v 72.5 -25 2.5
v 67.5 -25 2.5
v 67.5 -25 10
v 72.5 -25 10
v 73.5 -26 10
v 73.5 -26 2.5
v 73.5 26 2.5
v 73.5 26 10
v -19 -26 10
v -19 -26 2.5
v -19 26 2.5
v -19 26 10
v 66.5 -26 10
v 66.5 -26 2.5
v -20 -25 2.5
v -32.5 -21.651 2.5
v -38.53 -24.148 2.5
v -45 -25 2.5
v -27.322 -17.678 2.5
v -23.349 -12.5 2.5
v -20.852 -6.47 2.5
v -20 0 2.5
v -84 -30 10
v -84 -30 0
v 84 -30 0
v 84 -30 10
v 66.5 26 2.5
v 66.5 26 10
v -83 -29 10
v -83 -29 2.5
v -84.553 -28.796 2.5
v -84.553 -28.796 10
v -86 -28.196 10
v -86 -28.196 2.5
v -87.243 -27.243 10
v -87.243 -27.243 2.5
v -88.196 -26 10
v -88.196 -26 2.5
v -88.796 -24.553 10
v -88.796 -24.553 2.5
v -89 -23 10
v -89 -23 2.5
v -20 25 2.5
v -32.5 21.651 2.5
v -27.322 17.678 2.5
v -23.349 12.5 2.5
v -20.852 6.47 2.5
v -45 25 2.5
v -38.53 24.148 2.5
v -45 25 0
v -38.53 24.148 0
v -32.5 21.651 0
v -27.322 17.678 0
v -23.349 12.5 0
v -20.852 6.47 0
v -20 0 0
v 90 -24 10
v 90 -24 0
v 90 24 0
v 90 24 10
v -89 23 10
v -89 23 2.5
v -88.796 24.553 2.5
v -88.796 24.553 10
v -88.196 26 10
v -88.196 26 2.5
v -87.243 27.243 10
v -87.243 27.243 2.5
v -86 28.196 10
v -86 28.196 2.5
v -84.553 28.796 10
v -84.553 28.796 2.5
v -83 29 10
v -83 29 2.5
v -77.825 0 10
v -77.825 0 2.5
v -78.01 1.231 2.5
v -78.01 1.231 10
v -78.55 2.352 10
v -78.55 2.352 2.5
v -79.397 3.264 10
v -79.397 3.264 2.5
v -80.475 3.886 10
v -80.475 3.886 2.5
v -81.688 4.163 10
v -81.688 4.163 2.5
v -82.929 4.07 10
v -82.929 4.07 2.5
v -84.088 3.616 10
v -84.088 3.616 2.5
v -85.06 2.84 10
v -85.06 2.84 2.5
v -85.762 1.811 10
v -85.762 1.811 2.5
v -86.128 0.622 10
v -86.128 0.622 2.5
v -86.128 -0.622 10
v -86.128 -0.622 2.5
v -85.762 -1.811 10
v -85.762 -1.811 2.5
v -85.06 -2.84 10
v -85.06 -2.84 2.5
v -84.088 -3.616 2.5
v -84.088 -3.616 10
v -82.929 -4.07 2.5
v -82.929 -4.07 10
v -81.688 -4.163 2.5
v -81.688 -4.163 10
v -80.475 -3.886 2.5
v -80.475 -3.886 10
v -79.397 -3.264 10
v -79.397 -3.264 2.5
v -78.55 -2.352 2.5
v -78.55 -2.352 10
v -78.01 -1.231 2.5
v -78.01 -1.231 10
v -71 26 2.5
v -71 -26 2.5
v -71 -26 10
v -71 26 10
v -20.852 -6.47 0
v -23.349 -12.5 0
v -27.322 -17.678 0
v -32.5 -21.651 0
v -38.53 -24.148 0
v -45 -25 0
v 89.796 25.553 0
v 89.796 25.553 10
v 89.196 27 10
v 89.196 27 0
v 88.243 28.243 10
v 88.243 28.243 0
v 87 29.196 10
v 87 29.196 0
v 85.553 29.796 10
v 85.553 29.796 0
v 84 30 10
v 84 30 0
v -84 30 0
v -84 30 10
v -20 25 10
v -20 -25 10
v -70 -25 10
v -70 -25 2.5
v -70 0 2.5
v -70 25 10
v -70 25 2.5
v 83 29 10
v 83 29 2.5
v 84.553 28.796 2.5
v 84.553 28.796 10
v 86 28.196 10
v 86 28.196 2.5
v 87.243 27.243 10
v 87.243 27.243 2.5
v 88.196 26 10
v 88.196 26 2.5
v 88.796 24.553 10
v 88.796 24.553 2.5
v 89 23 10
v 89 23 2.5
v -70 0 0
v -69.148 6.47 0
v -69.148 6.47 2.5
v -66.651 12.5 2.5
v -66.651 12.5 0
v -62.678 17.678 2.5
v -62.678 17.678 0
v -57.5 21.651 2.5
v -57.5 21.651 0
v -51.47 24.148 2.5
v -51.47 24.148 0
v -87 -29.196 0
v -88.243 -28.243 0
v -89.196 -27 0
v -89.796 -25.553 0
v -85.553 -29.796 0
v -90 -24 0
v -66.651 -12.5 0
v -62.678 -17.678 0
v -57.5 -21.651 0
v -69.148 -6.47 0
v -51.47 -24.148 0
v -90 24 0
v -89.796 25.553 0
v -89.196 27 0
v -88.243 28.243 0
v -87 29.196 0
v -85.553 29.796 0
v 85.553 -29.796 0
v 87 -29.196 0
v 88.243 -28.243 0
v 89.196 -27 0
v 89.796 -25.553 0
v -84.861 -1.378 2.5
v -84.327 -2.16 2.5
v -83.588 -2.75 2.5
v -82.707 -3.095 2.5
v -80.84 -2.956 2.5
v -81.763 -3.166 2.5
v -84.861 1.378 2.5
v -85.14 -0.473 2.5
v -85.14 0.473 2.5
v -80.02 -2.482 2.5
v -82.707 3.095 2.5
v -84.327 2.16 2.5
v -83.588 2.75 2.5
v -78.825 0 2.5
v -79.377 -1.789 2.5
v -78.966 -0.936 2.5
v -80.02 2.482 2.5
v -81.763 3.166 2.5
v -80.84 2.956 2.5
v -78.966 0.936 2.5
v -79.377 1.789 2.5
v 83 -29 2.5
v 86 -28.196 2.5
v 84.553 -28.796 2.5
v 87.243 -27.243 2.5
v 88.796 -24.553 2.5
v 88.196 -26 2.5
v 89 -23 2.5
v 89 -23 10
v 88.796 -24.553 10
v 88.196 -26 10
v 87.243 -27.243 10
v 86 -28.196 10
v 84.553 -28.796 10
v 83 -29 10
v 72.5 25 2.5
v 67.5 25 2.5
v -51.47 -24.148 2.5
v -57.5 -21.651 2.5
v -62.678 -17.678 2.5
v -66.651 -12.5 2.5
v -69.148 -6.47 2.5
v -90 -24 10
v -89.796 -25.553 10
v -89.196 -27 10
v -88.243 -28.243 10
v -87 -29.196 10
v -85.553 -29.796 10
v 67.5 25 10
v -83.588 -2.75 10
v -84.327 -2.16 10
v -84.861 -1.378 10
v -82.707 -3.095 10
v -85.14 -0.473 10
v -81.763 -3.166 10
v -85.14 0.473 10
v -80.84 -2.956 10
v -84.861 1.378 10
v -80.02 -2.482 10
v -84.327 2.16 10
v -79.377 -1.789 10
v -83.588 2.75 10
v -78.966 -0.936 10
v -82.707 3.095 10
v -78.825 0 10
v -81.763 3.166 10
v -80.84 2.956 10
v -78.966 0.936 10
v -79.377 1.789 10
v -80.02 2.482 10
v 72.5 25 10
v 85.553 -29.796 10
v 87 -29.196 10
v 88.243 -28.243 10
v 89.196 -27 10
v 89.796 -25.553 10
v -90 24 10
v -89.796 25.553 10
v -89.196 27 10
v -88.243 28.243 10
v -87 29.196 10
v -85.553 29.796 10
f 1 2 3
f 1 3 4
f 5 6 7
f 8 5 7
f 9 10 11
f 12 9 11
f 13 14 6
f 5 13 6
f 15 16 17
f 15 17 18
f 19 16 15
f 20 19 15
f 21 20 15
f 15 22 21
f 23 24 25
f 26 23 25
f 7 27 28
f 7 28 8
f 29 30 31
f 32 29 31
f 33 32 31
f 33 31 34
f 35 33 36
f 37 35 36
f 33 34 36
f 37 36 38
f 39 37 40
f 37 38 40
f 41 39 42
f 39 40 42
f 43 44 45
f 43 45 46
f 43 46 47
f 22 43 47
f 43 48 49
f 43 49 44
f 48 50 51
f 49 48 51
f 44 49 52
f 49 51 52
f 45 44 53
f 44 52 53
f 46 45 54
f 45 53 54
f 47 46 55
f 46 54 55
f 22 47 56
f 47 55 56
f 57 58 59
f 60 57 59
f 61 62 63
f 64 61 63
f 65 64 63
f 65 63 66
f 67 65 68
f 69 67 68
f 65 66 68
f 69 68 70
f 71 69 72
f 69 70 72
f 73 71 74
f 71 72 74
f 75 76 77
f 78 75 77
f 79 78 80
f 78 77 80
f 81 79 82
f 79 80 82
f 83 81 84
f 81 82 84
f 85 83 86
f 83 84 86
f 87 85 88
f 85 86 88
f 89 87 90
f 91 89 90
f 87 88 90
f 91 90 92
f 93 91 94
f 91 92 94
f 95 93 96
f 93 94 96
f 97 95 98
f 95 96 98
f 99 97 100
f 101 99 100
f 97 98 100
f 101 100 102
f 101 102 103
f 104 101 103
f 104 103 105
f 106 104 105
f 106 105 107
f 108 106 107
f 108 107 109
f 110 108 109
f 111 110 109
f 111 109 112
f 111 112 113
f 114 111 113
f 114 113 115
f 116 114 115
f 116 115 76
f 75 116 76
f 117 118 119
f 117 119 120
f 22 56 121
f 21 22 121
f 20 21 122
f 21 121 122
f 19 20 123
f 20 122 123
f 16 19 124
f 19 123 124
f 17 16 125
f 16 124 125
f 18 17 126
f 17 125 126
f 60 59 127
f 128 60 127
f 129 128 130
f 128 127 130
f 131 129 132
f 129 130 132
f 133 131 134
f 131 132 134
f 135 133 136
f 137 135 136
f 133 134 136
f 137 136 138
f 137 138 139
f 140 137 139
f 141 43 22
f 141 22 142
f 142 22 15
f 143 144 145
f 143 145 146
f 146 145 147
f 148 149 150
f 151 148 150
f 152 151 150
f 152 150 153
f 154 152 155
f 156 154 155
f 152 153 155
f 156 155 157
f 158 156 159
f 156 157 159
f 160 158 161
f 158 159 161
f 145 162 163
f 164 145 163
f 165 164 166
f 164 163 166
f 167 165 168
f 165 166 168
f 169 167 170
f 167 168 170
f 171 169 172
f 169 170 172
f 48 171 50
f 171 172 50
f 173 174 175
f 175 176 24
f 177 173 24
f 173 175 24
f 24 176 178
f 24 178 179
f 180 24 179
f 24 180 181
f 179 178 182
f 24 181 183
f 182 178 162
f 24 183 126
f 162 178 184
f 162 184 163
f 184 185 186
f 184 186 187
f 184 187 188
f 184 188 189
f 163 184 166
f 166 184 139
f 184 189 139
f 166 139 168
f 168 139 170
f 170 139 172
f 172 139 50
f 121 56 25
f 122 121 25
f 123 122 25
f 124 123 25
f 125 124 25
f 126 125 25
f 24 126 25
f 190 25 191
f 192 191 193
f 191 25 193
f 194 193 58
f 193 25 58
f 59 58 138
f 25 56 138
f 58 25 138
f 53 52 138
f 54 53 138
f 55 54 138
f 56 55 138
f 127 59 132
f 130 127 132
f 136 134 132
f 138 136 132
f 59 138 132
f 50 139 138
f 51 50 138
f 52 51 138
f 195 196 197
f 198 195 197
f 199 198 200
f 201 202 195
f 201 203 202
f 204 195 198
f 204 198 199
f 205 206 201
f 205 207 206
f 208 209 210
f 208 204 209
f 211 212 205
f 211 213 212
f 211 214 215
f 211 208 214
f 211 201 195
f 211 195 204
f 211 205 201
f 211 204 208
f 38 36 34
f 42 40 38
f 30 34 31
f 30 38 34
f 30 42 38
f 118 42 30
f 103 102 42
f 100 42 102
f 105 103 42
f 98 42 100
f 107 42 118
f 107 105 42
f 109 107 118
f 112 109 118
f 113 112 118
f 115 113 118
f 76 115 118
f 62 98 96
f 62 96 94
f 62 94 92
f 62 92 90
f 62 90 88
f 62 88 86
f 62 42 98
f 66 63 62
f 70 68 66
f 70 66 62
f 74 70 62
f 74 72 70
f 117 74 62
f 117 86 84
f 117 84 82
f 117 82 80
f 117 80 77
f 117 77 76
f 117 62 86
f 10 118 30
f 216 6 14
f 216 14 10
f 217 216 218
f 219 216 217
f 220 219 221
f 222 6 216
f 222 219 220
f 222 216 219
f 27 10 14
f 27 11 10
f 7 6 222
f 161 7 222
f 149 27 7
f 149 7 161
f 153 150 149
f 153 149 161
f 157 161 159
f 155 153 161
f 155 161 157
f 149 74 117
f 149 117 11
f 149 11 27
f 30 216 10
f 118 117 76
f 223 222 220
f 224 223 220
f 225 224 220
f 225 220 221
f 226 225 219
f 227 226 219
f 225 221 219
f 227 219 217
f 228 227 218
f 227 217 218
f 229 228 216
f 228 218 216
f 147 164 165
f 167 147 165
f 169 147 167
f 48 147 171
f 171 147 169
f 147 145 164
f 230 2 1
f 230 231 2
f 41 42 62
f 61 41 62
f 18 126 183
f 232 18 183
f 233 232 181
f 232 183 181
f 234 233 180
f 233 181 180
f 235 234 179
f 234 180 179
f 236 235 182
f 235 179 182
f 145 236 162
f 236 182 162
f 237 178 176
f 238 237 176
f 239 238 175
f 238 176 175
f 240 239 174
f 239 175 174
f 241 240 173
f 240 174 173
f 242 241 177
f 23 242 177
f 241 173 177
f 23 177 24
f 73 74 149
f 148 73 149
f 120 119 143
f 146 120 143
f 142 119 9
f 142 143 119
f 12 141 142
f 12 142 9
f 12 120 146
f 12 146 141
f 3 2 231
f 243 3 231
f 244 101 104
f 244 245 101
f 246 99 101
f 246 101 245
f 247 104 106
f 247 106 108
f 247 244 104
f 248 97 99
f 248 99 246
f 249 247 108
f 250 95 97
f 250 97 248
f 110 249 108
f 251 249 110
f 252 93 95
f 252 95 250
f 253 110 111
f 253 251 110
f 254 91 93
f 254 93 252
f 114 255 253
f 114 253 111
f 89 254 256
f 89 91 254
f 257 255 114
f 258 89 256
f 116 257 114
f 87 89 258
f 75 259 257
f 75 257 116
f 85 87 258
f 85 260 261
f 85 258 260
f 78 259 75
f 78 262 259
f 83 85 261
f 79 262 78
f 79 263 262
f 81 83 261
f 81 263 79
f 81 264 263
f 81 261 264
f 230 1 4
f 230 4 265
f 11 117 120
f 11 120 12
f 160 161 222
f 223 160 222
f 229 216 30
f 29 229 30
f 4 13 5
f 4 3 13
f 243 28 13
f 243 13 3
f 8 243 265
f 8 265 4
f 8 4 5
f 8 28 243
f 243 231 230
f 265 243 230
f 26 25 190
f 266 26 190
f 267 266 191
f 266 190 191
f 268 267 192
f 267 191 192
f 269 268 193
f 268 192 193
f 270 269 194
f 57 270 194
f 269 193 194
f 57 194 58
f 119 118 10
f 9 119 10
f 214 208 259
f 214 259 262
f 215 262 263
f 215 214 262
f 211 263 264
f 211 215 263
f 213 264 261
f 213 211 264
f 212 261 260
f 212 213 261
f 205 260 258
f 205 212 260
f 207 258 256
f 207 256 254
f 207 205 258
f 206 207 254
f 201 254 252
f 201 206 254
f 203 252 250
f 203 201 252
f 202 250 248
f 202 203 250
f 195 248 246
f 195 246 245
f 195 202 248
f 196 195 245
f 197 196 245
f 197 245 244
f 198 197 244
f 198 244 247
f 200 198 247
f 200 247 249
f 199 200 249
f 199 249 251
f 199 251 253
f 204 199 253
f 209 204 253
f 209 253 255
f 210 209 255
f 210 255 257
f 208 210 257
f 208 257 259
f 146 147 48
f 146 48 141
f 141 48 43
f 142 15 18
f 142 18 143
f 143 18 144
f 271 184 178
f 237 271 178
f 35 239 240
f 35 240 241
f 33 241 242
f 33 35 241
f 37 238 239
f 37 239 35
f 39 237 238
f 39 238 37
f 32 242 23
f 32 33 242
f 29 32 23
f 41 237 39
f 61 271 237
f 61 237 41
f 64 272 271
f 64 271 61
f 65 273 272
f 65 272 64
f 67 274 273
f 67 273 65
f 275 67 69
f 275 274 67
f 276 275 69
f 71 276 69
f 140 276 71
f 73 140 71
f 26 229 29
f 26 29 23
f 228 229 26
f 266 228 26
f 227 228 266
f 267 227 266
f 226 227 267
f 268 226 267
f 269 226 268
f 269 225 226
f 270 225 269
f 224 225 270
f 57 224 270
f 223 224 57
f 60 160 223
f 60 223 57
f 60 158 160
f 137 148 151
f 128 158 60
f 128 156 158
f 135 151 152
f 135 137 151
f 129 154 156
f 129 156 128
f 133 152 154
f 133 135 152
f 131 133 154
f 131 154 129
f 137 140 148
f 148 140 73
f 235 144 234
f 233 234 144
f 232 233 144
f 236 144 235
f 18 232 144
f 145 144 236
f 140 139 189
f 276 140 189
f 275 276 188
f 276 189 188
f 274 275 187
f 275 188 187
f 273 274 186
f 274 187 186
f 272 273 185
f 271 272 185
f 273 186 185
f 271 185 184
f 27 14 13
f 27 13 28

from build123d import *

# Parameters (mm, degrees)
F0_R     = 4.175
F0_W     = 52
F0_H     = 52
F0_W_2   = 7
F0_W_3   = 5
F0_H_2   = 50
F0_R_2   = 3.175
F1_DEPTH = 2.5
F2_DEPTH = 10
F3_DEPTH = 10
F4_DEPTH = 10


with BuildPart() as f1:
    # F0 (on Top) → F1 (new body)
    with BuildSketch(Plane.XY):
        with BuildLine():
            Line((-84, -30), (84, -30))
            ThreePointArc((84, -30), (88.2426406871, -28.2426406871), (90, -24))
            Line((90, -24), (90, 24))
            ThreePointArc((90, 24), (88.2426406871, 28.2426406871), (84, 30))
            Line((84, 30), (-84, 30))
            ThreePointArc((-84, 30), (-88.2426406871, 28.2426406871), (-90, 24))
            Line((-90, 24), (-90, -24))
            ThreePointArc((-90, -24), (-88.2426406871, -28.2426406871), (-84, -30))
        make_face()
        with BuildLine():
            ThreePointArc((89, -23), (87.2426406871, -27.2426406871), (83, -29))
            Line((83, -29), (-83, -29))
            ThreePointArc((-83, -29), (-87.2426406871, -27.2426406871), (-89, -23))
            Line((-89, -23), (-89, 23))
            ThreePointArc((-89, 23), (-87.2426406871, 27.2426406871), (-83, 29))
            Line((-83, 29), (83, 29))
            ThreePointArc((83, 29), (87.2426406871, 27.2426406871), (89, 23))
            Line((89, 23), (89, -23))
        make_face(mode=Mode.SUBTRACT)
        with BuildLine():
            Line((-83, -29), (83, -29))
            ThreePointArc((83, -29), (87.2426406871, -27.2426406871), (89, -23))
            Line((89, -23), (89, 23))
            ThreePointArc((89, 23), (87.2426406871, 27.2426406871), (83, 29))
            Line((83, 29), (-83, 29))
            ThreePointArc((-83, 29), (-87.2426406871, 27.2426406871), (-89, 23))
            Line((-89, 23), (-89, -23))
            ThreePointArc((-89, -23), (-87.2426406871, -27.2426406871), (-83, -29))
        make_face()
        with Locations((-82, 0)):
            Circle(F0_R, mode=Mode.SUBTRACT)
        with Locations((-45, 0)):
            Rectangle(F0_W, F0_H, mode=Mode.SUBTRACT)
        with Locations((70, 0)):
            Rectangle(F0_W_2, F0_H, mode=Mode.SUBTRACT)
        with Locations((-45, 0)):
            Rectangle(F0_W, F0_H)
        Polygon((-20, 0), (-20, -25), (-45, -25), (-70, -25), (-70, 0), (-70, 25), (-45, 25), (-20, 25), align=None, mode=Mode.SUBTRACT)
        with Locations((70, 0)):
            Rectangle(F0_W_2, F0_H)
        with Locations((70, 0)):
            Rectangle(F0_W_3, F0_H_2, mode=Mode.SUBTRACT)
        with Locations((70, 0)):
            Rectangle(F0_W_3, F0_H_2)
        with BuildLine():
            Line((-45, -25), (-20, -25))
            Line((-20, -25), (-20, 0))
            ThreePointArc((-20, 0), (-27.3223304703, -17.6776695297), (-45, -25))
        make_face()
        with BuildLine():
            ThreePointArc((-45, 25), (-27.3223304703, 17.6776695297), (-20, 0))
            Line((-20, 0), (-20, 25))
            Line((-20, 25), (-45, 25))
        make_face()
        with BuildLine():
            Line((-70, 25), (-70, 0))
            ThreePointArc((-70, 0), (-62.6776695297, 17.6776695297), (-45, 25))
            Line((-45, 25), (-70, 25))
        make_face()
        with BuildLine():
            Line((-70, -25), (-45, -25))
            ThreePointArc((-45, -25), (-62.6776695297, -17.6776695297), (-70, 0))
            Line((-70, 0), (-70, -25))
        make_face()
        with Locations((-82, 0)):
            Circle(F0_R)
        with Locations((-82, 0)):
            Circle(F0_R_2, mode=Mode.SUBTRACT)
        with Locations((-82, 0)):
            Circle(F0_R_2)
    extrude(amount=F1_DEPTH)

    # F0 (on Top) → F2 (join)
    with BuildSketch(Plane.XY):
        with Locations((-45, 0)):
            Rectangle(F0_W, F0_H)
        Polygon((-20, 0), (-20, -25), (-45, -25), (-70, -25), (-70, 0), (-70, 25), (-45, 25), (-20, 25), align=None, mode=Mode.SUBTRACT)
        with Locations((70, 0)):
            Rectangle(F0_W_2, F0_H)
        with Locations((70, 0)):
            Rectangle(F0_W_3, F0_H_2, mode=Mode.SUBTRACT)
    extrude(amount=F2_DEPTH)

    # F0 (on Top) → F3 (join)
    with BuildSketch(Plane.XY):
        with Locations((-82, 0)):
            Circle(F0_R)
        with Locations((-82, 0)):
            Circle(F0_R_2, mode=Mode.SUBTRACT)
    extrude(amount=F3_DEPTH)

    # F0 (on Top) → F4 (join)
    with BuildSketch(Plane.XY):
        with BuildLine():
            Line((-84, -30), (84, -30))
            ThreePointArc((84, -30), (88.2426406871, -28.2426406871), (90, -24))
            Line((90, -24), (90, 24))
            ThreePointArc((90, 24), (88.2426406871, 28.2426406871), (84, 30))
            Line((84, 30), (-84, 30))
            ThreePointArc((-84, 30), (-88.2426406871, 28.2426406871), (-90, 24))
            Line((-90, 24), (-90, -24))
            ThreePointArc((-90, -24), (-88.2426406871, -28.2426406871), (-84, -30))
        make_face()
        with BuildLine():
            ThreePointArc((89, -23), (87.2426406871, -27.2426406871), (83, -29))
            Line((83, -29), (-83, -29))
            ThreePointArc((-83, -29), (-87.2426406871, -27.2426406871), (-89, -23))
            Line((-89, -23), (-89, 23))
            ThreePointArc((-89, 23), (-87.2426406871, 27.2426406871), (-83, 29))
            Line((-83, 29), (83, 29))
            ThreePointArc((83, 29), (87.2426406871, 27.2426406871), (89, 23))
            Line((89, 23), (89, -23))
        make_face(mode=Mode.SUBTRACT)
    extrude(amount=F4_DEPTH)


solid = f1.part
